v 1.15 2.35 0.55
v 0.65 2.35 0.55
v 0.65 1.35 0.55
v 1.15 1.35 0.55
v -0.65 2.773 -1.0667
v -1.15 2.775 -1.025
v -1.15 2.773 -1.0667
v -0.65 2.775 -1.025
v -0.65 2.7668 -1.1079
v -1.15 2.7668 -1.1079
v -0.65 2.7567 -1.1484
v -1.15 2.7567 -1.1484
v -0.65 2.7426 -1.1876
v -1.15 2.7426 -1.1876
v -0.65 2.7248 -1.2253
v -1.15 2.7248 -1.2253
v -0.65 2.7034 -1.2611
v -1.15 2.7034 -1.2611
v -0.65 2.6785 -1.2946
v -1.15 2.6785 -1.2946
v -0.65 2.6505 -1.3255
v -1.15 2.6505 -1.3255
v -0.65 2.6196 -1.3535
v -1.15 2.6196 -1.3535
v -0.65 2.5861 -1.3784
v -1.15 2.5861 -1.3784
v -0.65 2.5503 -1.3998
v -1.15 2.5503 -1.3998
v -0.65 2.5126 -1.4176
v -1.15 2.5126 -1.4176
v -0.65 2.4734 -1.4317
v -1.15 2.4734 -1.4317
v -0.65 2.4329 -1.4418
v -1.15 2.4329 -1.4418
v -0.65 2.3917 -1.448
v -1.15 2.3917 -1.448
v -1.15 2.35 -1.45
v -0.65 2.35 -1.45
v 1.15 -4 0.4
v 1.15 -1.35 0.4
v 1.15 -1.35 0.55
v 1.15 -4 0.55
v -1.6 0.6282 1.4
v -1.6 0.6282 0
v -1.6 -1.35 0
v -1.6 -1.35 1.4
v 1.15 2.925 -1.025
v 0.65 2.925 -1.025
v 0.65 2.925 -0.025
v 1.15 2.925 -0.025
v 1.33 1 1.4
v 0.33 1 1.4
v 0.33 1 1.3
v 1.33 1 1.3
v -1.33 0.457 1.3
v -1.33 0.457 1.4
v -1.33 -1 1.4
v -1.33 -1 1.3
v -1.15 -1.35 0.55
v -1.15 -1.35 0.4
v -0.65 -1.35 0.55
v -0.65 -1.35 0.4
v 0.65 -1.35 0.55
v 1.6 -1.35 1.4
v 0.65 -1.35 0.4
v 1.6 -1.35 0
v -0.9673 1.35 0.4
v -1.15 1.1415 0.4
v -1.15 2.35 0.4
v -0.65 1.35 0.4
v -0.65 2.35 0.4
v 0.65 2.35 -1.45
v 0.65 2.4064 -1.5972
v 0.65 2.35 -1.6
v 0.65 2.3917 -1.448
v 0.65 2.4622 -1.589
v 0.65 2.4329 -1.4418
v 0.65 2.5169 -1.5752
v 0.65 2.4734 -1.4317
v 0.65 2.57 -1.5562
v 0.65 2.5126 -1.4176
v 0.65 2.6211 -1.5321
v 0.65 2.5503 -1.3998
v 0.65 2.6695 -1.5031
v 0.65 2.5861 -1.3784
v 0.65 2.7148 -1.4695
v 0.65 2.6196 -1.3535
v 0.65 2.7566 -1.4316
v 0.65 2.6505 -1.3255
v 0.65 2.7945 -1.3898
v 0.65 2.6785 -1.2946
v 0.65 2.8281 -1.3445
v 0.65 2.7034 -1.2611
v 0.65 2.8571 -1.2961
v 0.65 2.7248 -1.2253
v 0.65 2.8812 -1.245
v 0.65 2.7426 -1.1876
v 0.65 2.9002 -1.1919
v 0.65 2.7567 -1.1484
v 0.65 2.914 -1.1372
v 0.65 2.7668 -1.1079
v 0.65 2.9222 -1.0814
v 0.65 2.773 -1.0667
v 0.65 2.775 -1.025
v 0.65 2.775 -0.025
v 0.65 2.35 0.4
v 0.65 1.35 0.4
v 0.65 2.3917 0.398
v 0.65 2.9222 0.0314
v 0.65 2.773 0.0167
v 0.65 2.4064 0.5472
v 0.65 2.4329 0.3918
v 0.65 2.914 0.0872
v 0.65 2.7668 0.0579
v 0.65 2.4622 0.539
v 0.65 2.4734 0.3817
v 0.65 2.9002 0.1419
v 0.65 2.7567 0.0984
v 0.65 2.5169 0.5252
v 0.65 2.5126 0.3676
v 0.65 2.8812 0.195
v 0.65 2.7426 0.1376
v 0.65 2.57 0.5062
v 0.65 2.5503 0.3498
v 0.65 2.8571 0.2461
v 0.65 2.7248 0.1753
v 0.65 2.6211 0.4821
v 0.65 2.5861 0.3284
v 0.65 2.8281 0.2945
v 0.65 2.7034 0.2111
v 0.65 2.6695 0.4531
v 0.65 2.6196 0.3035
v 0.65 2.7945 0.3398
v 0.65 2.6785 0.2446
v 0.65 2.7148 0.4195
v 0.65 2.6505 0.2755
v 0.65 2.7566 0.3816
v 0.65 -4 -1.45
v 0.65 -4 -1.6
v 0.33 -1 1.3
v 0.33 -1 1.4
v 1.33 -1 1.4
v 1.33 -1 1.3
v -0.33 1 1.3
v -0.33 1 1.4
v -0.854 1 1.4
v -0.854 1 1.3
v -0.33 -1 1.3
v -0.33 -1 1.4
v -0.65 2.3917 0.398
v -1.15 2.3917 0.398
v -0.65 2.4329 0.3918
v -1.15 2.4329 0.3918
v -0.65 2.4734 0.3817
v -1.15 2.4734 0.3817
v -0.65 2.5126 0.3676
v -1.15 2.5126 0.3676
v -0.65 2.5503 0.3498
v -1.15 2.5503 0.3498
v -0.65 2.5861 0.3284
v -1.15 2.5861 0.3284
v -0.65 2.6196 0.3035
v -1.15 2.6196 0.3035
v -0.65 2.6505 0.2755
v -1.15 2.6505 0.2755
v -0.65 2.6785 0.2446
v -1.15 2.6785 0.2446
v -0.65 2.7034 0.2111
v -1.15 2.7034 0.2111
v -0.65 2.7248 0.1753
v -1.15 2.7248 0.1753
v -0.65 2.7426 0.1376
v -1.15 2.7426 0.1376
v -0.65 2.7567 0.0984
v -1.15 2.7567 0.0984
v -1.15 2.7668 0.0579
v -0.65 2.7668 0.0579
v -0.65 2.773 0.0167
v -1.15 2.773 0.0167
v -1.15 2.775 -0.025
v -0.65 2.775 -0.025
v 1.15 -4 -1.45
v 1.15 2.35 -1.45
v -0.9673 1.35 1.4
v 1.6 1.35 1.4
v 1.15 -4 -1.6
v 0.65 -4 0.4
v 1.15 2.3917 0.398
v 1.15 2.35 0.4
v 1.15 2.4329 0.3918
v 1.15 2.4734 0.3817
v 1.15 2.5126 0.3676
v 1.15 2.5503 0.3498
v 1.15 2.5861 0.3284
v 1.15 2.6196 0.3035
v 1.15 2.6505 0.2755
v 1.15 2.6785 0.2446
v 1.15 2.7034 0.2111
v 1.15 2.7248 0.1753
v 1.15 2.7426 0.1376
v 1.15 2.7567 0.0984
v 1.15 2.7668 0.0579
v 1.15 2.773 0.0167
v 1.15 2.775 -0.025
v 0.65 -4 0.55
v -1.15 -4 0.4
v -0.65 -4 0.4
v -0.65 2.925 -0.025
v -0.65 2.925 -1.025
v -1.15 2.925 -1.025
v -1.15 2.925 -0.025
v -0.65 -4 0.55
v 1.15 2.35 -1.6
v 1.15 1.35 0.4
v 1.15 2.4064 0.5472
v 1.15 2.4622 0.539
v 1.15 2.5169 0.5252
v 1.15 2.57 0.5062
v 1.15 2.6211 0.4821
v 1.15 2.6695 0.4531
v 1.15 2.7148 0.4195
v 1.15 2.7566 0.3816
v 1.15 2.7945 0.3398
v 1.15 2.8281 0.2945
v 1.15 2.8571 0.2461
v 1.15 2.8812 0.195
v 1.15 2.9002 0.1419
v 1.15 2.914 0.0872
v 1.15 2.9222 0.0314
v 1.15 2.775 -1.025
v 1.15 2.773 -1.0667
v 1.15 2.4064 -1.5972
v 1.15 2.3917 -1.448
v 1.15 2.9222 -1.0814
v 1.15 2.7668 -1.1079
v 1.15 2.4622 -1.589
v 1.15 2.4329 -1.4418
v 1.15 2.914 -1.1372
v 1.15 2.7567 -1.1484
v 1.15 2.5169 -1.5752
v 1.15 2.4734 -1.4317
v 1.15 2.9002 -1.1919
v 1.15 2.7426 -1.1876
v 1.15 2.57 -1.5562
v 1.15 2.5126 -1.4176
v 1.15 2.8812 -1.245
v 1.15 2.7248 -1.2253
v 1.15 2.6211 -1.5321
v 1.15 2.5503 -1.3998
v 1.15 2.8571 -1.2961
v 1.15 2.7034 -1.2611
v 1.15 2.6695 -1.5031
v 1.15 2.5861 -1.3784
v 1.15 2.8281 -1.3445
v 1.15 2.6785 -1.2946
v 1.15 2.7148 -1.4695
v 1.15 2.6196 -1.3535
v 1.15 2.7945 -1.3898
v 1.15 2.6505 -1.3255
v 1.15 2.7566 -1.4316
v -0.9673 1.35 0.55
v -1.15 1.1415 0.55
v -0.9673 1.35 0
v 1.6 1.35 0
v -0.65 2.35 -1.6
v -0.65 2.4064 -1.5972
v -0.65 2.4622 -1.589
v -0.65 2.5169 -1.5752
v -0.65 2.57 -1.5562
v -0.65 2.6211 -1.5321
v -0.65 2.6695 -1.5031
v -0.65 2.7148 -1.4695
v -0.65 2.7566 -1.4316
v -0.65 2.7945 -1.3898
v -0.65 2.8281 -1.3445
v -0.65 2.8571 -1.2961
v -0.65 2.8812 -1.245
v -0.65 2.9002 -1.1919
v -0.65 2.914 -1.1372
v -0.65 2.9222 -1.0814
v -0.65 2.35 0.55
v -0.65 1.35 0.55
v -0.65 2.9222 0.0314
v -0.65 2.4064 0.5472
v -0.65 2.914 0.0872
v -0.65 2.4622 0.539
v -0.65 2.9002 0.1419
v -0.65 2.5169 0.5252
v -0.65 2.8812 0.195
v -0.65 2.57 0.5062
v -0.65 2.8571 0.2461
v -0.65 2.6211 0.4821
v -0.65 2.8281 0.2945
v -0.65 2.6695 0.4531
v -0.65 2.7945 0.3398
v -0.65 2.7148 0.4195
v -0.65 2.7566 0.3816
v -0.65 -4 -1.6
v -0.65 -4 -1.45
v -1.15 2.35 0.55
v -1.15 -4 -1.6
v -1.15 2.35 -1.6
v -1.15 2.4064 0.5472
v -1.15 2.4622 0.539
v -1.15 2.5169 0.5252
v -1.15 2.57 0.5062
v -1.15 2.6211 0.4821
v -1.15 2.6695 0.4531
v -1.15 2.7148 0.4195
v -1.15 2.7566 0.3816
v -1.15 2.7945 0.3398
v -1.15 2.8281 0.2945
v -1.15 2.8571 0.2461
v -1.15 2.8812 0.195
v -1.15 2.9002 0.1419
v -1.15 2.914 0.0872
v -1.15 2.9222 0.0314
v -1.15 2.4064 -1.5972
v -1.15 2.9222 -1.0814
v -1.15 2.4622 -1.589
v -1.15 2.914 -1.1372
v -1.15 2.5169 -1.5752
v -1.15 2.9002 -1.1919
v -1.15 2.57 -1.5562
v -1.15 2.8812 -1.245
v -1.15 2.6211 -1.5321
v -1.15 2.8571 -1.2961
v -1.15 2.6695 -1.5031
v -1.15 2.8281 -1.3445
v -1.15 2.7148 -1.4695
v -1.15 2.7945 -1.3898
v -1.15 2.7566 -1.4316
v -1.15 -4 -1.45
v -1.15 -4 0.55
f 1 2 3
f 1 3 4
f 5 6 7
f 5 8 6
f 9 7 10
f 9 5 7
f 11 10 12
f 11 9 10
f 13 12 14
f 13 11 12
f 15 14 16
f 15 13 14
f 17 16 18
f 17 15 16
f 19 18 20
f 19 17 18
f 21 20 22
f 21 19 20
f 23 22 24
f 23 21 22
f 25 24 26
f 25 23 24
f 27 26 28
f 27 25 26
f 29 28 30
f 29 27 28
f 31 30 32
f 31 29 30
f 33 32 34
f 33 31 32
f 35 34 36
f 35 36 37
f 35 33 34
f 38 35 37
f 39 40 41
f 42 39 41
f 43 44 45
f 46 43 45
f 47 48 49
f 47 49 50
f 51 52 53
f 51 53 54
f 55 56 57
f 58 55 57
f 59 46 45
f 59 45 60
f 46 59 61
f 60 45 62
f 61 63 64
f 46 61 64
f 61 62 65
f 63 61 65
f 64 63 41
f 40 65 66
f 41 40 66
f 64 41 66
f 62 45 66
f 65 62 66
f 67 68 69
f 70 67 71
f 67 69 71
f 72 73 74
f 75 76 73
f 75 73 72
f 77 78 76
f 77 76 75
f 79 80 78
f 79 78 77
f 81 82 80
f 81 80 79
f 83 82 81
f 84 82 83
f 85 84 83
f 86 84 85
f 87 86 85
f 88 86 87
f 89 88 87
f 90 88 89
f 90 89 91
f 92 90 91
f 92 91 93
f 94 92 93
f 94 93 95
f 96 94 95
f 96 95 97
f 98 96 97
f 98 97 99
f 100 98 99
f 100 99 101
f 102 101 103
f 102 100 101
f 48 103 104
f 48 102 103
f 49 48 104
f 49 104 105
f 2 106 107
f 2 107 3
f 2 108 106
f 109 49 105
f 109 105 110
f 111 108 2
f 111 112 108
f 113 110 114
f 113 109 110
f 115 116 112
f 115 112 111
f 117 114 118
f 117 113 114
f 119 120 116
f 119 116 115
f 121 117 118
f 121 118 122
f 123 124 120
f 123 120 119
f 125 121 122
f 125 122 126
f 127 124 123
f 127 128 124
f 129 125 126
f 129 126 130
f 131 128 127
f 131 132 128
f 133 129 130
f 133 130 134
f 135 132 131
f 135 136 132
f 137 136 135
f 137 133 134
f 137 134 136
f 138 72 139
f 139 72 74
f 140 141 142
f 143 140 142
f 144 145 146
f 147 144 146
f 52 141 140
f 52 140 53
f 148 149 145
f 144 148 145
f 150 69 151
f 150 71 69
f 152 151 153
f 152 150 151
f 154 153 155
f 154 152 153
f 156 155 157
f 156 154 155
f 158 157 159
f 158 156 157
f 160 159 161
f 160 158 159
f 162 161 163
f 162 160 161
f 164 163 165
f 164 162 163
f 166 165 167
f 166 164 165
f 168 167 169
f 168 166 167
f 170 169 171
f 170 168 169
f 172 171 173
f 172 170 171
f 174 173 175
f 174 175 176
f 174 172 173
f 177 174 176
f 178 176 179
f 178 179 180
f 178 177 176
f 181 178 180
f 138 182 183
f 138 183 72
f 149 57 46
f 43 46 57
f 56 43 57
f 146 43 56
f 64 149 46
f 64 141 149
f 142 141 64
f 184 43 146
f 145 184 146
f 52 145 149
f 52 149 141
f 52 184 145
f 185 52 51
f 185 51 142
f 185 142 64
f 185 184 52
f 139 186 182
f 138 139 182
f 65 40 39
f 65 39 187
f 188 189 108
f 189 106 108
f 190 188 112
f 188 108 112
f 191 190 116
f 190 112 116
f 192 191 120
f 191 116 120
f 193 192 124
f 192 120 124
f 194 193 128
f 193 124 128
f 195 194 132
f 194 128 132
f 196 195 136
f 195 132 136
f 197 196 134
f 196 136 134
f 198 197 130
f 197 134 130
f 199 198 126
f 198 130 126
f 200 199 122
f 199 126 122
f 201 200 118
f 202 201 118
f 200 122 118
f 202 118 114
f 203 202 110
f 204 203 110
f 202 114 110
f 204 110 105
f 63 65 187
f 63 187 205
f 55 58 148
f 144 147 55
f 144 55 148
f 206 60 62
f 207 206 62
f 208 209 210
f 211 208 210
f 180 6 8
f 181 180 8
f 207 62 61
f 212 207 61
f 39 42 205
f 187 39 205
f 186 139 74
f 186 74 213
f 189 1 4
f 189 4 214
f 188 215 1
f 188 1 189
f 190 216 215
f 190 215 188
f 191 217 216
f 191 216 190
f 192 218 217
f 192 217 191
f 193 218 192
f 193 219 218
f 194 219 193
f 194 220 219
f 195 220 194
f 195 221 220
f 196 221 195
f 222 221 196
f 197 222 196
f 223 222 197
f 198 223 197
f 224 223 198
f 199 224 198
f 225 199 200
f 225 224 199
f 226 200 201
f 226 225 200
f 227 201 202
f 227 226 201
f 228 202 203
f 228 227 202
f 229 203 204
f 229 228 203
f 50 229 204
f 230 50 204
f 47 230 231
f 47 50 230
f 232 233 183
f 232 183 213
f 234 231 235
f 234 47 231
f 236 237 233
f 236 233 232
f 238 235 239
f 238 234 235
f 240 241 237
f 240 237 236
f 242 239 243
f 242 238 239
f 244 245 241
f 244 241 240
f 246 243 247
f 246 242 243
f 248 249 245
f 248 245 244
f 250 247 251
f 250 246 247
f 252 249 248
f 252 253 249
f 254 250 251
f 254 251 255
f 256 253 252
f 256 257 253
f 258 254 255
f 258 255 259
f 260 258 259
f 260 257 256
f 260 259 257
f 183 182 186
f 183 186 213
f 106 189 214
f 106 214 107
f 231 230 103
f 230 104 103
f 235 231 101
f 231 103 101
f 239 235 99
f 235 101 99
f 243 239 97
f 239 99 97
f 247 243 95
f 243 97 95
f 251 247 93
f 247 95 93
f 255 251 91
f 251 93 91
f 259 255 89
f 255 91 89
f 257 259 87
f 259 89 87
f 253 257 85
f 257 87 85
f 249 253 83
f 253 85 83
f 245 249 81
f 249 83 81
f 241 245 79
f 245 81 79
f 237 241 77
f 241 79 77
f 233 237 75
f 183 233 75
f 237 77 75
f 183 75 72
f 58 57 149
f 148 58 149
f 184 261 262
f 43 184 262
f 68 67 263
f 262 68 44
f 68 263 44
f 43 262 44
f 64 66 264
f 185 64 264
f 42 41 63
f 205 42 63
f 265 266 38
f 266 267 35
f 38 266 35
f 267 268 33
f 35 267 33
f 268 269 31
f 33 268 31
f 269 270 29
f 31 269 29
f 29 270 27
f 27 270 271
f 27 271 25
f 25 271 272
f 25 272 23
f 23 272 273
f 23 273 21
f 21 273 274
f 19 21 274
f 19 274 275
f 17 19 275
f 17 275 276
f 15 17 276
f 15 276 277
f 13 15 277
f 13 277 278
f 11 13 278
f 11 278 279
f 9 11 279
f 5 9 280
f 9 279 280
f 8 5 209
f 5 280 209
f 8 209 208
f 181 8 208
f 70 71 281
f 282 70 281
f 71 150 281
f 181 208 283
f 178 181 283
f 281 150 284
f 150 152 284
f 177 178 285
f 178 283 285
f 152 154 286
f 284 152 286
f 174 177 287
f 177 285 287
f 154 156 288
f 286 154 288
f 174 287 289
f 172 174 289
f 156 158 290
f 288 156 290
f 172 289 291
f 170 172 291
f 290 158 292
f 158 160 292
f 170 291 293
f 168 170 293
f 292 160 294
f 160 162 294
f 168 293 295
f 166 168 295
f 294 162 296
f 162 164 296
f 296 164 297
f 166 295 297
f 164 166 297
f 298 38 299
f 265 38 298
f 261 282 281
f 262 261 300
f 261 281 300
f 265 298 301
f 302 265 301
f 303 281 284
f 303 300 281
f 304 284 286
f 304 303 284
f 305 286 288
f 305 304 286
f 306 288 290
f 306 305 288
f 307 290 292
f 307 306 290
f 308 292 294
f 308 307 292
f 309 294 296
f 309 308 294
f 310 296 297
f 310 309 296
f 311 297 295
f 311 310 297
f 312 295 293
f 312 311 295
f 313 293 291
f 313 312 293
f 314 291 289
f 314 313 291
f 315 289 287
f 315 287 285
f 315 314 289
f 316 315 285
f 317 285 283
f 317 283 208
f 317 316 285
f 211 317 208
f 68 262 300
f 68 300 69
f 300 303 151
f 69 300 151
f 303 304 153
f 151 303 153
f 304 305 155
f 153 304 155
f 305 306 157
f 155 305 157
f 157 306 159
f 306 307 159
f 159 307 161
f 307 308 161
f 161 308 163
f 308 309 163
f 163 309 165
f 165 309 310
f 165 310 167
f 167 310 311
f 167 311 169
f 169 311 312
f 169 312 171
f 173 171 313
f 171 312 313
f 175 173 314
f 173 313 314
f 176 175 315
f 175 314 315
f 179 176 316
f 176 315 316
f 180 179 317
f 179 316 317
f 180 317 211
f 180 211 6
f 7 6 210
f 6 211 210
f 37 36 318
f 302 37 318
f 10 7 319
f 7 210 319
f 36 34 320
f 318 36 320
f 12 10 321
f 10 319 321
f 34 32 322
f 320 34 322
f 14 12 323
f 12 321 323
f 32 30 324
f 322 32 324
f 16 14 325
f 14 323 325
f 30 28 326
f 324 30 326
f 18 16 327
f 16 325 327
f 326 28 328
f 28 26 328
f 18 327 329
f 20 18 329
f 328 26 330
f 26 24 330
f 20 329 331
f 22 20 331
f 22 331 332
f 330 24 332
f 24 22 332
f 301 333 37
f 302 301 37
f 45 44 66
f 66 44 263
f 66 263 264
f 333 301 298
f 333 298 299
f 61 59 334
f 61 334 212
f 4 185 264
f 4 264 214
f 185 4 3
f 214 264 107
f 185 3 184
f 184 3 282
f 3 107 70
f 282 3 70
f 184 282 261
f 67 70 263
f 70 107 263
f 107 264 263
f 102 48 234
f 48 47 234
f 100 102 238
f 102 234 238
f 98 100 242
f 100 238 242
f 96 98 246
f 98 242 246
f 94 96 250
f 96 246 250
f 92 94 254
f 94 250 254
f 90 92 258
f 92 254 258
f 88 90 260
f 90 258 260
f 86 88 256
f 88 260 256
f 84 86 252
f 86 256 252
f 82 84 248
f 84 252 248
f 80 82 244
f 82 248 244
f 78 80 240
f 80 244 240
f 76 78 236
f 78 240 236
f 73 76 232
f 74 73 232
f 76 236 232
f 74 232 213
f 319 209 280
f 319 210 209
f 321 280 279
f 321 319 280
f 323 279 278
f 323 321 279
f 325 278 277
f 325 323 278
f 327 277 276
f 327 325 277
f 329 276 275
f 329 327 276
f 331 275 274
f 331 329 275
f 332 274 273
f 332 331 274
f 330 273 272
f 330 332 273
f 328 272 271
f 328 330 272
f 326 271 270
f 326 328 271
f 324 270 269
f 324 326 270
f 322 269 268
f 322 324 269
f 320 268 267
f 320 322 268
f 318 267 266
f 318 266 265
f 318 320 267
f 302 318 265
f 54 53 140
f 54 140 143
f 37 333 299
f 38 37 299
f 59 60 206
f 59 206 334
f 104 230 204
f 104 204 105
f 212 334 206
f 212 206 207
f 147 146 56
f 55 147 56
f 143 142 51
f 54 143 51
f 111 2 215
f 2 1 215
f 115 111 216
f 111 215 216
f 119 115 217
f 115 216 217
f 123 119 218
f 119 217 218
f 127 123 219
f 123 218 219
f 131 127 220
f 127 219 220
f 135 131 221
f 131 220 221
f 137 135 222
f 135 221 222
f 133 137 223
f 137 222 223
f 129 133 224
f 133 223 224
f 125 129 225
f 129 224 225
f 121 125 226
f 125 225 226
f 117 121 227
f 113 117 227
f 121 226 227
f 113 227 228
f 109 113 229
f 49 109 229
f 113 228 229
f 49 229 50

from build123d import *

# Parameters (mm, degrees)
F1_DEPTH = 1.4
F2_W     = 1
F2_H     = 2
F3_DEPTH = 0.1
F4_W     = 0.5
F4_H     = 0.15
F5_DEPTH = 4


with BuildPart() as f1:
    # F0 (on Top) → F1 (new body)
    with BuildSketch(Plane.XY):
        Polygon((1.6, -1.35), (1.6, 1.35), (-0.9672628953, 1.35), (-1.6, 0.628211031), (-1.6, -1.35), align=None)
    extrude(amount=F1_DEPTH)

    # F2 (on face) → F3 (cut)
    with BuildSketch(Plane.XY.offset(1.4)):
        with Locations((0.83, 0)):
            Rectangle(F2_W, F2_H)
        Polygon((-0.33, -1), (-0.33, 1), (-0.8539721624, 1), (-1.33, 0.4569756704), (-1.33, -1), align=None)
    extrude(amount=-F3_DEPTH, mode=Mode.SUBTRACT)

    # F6: F5 across plane


with BuildPart() as f5:
    # F4 (on Front) → F5 (new body)
    with BuildSketch(Plane.XZ):
        with Locations((-0.9, 0.475)):
            Rectangle(F4_W, F4_H)
    extrude(amount=F5_DEPTH)


with BuildPart() as f1_1:
    add(f1.part)
    add(f5.part.mirror(Plane.YZ))



with BuildPart() as f9:
    # F9: sweep along a path in F8
    with BuildLine(Plane.YZ.offset(-0.9)) as f9_path:
        Line((0, 0.475), (2.35, 0.475))
        ThreePointArc((2.35, 0.475), (2.7035533906, 0.3285533906), (2.85, -0.025))
        Line((2.85, -0.025), (2.85, -1.025))
        ThreePointArc((2.85, -1.025), (2.7035533906, -1.3785533906), (2.35, -1.525))
        Line((2.35, -1.525), (-4, -1.525))
    # F4 (on Front) → F9 (sweep)
    with BuildSketch(Plane.XZ):
        with Locations((-0.9, 0.475)):
            Rectangle(F4_W, F4_H)
    sweep(path=f9_path.line)


with BuildPart() as f1_2:
    add(f1_1.part)

    add(f5.part)  # F10 merges F5

    add(f9.part)  # F10 merges F9
    # F10: F9 across plane
    add(f9.part.mirror(Plane.YZ))


solid = f1_2.part
